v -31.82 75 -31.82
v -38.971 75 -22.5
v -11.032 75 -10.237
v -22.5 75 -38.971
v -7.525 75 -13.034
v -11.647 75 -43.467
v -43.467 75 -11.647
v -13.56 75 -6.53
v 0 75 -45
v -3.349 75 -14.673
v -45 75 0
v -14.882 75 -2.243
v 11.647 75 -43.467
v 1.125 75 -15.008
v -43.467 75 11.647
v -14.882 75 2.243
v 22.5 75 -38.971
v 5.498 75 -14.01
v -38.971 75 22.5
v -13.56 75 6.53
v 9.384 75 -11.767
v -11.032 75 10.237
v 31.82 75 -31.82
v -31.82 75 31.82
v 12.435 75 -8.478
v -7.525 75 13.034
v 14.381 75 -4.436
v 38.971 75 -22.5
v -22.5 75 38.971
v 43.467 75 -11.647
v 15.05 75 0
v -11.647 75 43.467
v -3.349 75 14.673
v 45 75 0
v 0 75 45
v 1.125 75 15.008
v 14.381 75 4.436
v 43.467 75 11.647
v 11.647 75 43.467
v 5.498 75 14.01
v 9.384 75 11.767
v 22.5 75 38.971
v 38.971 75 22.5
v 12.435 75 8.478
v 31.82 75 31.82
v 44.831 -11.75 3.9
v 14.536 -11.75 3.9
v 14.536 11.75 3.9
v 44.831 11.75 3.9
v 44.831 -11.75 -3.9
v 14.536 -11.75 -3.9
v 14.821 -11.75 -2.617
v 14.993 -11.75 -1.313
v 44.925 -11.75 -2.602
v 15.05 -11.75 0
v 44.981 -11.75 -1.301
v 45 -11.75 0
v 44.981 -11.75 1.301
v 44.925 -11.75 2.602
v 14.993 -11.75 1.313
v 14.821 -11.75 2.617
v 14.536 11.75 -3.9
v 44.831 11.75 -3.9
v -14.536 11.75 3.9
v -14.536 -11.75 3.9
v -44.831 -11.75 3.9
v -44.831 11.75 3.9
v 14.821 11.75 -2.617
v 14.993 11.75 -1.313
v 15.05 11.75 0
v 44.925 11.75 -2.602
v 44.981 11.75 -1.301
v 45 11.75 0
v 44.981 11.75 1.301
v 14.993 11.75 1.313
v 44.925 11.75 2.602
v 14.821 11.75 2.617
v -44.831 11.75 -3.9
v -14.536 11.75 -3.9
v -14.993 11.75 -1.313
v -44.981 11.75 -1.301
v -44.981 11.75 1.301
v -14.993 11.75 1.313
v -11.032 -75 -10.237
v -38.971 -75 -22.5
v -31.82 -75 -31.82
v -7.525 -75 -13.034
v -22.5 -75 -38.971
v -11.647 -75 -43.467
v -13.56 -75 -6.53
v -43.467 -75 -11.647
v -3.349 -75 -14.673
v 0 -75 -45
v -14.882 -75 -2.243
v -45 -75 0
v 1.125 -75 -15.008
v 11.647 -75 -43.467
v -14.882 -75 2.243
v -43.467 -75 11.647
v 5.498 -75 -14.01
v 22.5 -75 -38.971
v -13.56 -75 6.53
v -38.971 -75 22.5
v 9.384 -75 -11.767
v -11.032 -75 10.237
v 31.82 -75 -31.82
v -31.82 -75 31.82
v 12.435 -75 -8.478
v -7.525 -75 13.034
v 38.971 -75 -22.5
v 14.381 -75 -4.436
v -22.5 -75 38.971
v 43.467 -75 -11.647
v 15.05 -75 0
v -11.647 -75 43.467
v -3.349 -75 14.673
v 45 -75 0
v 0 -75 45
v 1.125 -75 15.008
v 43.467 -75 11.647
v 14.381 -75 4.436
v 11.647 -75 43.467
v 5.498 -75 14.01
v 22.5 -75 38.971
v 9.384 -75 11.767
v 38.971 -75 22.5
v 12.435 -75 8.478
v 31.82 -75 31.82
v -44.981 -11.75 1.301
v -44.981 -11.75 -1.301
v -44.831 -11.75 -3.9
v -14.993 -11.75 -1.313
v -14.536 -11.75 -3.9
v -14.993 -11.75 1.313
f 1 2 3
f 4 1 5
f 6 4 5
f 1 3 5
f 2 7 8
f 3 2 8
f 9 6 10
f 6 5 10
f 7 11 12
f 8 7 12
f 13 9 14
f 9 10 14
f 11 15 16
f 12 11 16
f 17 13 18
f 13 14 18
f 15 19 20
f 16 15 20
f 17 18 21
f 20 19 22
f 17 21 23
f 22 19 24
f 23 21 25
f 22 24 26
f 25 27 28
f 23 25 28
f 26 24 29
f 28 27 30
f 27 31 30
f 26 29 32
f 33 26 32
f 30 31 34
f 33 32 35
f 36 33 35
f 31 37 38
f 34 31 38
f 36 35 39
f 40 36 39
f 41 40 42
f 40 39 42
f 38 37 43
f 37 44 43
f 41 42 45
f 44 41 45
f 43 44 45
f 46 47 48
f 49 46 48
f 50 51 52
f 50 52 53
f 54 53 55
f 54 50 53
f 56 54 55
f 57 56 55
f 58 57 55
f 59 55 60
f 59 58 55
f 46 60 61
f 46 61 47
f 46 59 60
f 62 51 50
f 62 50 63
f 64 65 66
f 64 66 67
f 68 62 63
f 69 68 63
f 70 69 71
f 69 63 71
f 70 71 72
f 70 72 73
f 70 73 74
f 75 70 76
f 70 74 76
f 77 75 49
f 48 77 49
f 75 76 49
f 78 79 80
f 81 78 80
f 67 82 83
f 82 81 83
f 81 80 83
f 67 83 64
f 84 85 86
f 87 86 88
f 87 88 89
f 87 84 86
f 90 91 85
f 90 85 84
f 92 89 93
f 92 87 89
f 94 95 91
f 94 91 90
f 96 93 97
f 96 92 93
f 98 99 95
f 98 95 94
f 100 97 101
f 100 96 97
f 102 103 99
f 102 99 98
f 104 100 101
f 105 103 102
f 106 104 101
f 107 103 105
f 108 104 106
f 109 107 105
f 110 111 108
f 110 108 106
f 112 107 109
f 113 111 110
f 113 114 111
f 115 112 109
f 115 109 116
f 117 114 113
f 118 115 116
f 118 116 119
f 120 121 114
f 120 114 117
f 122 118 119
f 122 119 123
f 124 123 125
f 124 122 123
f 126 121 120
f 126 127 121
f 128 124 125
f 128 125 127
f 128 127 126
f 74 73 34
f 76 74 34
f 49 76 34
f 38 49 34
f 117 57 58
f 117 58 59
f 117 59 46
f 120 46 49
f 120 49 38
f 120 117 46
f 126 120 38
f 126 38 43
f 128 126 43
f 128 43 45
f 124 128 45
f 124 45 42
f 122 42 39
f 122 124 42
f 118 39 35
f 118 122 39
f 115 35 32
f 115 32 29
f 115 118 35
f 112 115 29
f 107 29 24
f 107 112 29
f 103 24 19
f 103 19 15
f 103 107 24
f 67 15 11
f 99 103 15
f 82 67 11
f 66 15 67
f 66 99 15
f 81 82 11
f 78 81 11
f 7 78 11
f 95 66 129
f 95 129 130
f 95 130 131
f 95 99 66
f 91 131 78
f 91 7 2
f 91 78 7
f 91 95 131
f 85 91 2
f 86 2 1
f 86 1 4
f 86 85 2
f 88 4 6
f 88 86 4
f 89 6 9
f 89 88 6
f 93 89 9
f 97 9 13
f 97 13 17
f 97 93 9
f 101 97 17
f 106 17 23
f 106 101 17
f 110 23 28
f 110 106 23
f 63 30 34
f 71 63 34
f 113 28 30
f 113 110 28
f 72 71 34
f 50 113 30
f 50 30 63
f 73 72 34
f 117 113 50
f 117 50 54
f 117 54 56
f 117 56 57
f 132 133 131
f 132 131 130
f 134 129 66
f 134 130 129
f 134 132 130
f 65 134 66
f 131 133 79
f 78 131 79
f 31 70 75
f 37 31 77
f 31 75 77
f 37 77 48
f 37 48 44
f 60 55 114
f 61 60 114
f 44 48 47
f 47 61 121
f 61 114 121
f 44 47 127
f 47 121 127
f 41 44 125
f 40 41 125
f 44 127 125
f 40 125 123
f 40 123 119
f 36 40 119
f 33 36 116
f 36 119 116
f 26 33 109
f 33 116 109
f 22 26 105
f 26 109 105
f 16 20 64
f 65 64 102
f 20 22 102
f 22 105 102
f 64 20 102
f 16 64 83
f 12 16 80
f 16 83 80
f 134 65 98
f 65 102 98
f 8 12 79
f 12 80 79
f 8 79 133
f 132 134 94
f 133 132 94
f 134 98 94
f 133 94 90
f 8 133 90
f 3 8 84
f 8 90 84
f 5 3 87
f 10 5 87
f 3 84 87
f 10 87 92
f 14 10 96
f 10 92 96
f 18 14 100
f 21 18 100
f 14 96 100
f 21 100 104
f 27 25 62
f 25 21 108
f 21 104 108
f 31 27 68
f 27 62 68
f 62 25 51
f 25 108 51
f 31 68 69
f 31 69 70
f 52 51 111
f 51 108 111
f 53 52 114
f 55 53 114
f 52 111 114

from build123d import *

# Parameters (mm, degrees)
F0_R     = 45
F1_DEPTH = 75
F2_R     = 15.05
F3_DEPTH = 150
F4_W     = 23.5
F4_H     = 7.8
F5_DEPTH = 63


with BuildPart() as f1:
    # F0 (on Front) → F1 (new body, symmetric)
    with BuildSketch(Plane.XZ):
        Circle(F0_R)
    extrude(amount=F1_DEPTH, both=True)

    # F2 (on face) → F3 (cut, symmetric)
    with BuildSketch(Plane.XZ.offset(75)):
        Circle(F2_R)
    extrude(amount=F3_DEPTH, both=True, mode=Mode.SUBTRACT)

    # F4 (on Right) → F5 (cut, symmetric)
    with BuildSketch(Plane.YZ):
        Rectangle(F4_W, F4_H)
    extrude(amount=F5_DEPTH, both=True, mode=Mode.SUBTRACT)


solid = f1.part
